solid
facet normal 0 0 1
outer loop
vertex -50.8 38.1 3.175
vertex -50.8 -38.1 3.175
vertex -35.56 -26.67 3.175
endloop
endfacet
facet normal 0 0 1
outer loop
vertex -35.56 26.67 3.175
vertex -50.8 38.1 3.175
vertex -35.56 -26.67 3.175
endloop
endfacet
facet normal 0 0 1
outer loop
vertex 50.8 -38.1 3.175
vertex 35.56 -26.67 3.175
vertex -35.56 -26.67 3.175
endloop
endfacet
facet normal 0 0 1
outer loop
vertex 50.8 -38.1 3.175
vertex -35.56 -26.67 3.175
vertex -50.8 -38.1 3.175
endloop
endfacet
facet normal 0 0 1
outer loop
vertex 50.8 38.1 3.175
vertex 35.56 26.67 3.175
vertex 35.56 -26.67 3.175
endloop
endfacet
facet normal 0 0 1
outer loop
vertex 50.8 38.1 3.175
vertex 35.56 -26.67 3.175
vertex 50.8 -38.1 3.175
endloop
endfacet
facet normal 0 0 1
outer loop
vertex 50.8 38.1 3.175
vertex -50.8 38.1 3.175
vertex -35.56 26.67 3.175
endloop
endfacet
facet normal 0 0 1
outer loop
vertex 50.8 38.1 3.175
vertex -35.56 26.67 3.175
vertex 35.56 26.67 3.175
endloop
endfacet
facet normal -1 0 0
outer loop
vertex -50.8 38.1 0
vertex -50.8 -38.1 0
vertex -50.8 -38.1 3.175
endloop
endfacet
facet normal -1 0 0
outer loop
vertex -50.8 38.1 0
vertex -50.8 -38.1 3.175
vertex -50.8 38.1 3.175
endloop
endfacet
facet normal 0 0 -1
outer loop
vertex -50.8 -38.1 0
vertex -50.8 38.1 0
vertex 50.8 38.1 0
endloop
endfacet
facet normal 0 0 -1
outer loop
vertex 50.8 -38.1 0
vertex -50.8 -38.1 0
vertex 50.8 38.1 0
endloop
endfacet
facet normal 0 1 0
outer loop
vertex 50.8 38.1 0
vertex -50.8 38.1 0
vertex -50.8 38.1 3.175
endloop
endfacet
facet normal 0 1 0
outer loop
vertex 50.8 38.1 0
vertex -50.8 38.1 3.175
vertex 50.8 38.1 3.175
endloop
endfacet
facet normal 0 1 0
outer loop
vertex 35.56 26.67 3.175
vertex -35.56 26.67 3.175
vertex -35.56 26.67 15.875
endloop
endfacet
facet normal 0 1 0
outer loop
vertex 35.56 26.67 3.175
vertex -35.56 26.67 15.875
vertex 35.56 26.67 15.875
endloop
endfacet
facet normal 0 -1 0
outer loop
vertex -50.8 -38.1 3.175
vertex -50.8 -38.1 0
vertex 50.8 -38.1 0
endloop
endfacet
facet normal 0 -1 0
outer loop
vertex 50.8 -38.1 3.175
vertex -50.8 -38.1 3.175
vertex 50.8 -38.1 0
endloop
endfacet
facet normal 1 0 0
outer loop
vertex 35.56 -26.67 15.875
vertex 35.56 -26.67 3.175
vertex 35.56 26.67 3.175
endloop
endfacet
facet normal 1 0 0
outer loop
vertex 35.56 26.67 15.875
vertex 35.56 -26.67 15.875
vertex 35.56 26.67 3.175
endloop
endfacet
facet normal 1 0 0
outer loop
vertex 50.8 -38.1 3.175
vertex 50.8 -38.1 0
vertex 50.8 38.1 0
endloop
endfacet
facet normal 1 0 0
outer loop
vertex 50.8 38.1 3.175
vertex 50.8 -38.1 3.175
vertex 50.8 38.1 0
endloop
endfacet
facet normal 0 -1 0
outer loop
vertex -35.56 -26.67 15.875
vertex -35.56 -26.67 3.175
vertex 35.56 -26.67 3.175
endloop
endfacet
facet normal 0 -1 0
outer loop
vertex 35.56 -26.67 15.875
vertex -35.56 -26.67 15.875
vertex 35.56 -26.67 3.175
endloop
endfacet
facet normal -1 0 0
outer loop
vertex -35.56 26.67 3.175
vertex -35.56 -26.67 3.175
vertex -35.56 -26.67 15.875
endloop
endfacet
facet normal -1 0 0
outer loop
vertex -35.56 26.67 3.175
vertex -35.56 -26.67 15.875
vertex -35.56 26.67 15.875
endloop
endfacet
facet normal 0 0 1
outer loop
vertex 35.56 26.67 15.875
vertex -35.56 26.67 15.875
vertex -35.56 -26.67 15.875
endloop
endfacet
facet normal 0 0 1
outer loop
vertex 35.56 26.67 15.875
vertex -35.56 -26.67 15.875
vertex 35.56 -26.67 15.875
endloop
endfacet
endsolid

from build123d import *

# Parameters (mm, degrees)
F0_W     = 71.12
F0_H     = 53.34
F0_W_2   = 101.6
F0_H_2   = 76.2
F1_DEPTH = 3.175
F2_DEPTH = 15.875


with BuildPart() as f1:
    # F0 (on Top) → F1 (new body)
    with BuildSketch(Plane.XY):
        Rectangle(F0_W, F0_H)
        Rectangle(F0_W_2, F0_H_2)
        Rectangle(F0_W, F0_H, mode=Mode.SUBTRACT)
    extrude(amount=F1_DEPTH)

    # F0 (on Top) → F2 (join)
    with BuildSketch(Plane.XY):
        Rectangle(F0_W, F0_H)
    extrude(amount=F2_DEPTH)


solid = f1.part
